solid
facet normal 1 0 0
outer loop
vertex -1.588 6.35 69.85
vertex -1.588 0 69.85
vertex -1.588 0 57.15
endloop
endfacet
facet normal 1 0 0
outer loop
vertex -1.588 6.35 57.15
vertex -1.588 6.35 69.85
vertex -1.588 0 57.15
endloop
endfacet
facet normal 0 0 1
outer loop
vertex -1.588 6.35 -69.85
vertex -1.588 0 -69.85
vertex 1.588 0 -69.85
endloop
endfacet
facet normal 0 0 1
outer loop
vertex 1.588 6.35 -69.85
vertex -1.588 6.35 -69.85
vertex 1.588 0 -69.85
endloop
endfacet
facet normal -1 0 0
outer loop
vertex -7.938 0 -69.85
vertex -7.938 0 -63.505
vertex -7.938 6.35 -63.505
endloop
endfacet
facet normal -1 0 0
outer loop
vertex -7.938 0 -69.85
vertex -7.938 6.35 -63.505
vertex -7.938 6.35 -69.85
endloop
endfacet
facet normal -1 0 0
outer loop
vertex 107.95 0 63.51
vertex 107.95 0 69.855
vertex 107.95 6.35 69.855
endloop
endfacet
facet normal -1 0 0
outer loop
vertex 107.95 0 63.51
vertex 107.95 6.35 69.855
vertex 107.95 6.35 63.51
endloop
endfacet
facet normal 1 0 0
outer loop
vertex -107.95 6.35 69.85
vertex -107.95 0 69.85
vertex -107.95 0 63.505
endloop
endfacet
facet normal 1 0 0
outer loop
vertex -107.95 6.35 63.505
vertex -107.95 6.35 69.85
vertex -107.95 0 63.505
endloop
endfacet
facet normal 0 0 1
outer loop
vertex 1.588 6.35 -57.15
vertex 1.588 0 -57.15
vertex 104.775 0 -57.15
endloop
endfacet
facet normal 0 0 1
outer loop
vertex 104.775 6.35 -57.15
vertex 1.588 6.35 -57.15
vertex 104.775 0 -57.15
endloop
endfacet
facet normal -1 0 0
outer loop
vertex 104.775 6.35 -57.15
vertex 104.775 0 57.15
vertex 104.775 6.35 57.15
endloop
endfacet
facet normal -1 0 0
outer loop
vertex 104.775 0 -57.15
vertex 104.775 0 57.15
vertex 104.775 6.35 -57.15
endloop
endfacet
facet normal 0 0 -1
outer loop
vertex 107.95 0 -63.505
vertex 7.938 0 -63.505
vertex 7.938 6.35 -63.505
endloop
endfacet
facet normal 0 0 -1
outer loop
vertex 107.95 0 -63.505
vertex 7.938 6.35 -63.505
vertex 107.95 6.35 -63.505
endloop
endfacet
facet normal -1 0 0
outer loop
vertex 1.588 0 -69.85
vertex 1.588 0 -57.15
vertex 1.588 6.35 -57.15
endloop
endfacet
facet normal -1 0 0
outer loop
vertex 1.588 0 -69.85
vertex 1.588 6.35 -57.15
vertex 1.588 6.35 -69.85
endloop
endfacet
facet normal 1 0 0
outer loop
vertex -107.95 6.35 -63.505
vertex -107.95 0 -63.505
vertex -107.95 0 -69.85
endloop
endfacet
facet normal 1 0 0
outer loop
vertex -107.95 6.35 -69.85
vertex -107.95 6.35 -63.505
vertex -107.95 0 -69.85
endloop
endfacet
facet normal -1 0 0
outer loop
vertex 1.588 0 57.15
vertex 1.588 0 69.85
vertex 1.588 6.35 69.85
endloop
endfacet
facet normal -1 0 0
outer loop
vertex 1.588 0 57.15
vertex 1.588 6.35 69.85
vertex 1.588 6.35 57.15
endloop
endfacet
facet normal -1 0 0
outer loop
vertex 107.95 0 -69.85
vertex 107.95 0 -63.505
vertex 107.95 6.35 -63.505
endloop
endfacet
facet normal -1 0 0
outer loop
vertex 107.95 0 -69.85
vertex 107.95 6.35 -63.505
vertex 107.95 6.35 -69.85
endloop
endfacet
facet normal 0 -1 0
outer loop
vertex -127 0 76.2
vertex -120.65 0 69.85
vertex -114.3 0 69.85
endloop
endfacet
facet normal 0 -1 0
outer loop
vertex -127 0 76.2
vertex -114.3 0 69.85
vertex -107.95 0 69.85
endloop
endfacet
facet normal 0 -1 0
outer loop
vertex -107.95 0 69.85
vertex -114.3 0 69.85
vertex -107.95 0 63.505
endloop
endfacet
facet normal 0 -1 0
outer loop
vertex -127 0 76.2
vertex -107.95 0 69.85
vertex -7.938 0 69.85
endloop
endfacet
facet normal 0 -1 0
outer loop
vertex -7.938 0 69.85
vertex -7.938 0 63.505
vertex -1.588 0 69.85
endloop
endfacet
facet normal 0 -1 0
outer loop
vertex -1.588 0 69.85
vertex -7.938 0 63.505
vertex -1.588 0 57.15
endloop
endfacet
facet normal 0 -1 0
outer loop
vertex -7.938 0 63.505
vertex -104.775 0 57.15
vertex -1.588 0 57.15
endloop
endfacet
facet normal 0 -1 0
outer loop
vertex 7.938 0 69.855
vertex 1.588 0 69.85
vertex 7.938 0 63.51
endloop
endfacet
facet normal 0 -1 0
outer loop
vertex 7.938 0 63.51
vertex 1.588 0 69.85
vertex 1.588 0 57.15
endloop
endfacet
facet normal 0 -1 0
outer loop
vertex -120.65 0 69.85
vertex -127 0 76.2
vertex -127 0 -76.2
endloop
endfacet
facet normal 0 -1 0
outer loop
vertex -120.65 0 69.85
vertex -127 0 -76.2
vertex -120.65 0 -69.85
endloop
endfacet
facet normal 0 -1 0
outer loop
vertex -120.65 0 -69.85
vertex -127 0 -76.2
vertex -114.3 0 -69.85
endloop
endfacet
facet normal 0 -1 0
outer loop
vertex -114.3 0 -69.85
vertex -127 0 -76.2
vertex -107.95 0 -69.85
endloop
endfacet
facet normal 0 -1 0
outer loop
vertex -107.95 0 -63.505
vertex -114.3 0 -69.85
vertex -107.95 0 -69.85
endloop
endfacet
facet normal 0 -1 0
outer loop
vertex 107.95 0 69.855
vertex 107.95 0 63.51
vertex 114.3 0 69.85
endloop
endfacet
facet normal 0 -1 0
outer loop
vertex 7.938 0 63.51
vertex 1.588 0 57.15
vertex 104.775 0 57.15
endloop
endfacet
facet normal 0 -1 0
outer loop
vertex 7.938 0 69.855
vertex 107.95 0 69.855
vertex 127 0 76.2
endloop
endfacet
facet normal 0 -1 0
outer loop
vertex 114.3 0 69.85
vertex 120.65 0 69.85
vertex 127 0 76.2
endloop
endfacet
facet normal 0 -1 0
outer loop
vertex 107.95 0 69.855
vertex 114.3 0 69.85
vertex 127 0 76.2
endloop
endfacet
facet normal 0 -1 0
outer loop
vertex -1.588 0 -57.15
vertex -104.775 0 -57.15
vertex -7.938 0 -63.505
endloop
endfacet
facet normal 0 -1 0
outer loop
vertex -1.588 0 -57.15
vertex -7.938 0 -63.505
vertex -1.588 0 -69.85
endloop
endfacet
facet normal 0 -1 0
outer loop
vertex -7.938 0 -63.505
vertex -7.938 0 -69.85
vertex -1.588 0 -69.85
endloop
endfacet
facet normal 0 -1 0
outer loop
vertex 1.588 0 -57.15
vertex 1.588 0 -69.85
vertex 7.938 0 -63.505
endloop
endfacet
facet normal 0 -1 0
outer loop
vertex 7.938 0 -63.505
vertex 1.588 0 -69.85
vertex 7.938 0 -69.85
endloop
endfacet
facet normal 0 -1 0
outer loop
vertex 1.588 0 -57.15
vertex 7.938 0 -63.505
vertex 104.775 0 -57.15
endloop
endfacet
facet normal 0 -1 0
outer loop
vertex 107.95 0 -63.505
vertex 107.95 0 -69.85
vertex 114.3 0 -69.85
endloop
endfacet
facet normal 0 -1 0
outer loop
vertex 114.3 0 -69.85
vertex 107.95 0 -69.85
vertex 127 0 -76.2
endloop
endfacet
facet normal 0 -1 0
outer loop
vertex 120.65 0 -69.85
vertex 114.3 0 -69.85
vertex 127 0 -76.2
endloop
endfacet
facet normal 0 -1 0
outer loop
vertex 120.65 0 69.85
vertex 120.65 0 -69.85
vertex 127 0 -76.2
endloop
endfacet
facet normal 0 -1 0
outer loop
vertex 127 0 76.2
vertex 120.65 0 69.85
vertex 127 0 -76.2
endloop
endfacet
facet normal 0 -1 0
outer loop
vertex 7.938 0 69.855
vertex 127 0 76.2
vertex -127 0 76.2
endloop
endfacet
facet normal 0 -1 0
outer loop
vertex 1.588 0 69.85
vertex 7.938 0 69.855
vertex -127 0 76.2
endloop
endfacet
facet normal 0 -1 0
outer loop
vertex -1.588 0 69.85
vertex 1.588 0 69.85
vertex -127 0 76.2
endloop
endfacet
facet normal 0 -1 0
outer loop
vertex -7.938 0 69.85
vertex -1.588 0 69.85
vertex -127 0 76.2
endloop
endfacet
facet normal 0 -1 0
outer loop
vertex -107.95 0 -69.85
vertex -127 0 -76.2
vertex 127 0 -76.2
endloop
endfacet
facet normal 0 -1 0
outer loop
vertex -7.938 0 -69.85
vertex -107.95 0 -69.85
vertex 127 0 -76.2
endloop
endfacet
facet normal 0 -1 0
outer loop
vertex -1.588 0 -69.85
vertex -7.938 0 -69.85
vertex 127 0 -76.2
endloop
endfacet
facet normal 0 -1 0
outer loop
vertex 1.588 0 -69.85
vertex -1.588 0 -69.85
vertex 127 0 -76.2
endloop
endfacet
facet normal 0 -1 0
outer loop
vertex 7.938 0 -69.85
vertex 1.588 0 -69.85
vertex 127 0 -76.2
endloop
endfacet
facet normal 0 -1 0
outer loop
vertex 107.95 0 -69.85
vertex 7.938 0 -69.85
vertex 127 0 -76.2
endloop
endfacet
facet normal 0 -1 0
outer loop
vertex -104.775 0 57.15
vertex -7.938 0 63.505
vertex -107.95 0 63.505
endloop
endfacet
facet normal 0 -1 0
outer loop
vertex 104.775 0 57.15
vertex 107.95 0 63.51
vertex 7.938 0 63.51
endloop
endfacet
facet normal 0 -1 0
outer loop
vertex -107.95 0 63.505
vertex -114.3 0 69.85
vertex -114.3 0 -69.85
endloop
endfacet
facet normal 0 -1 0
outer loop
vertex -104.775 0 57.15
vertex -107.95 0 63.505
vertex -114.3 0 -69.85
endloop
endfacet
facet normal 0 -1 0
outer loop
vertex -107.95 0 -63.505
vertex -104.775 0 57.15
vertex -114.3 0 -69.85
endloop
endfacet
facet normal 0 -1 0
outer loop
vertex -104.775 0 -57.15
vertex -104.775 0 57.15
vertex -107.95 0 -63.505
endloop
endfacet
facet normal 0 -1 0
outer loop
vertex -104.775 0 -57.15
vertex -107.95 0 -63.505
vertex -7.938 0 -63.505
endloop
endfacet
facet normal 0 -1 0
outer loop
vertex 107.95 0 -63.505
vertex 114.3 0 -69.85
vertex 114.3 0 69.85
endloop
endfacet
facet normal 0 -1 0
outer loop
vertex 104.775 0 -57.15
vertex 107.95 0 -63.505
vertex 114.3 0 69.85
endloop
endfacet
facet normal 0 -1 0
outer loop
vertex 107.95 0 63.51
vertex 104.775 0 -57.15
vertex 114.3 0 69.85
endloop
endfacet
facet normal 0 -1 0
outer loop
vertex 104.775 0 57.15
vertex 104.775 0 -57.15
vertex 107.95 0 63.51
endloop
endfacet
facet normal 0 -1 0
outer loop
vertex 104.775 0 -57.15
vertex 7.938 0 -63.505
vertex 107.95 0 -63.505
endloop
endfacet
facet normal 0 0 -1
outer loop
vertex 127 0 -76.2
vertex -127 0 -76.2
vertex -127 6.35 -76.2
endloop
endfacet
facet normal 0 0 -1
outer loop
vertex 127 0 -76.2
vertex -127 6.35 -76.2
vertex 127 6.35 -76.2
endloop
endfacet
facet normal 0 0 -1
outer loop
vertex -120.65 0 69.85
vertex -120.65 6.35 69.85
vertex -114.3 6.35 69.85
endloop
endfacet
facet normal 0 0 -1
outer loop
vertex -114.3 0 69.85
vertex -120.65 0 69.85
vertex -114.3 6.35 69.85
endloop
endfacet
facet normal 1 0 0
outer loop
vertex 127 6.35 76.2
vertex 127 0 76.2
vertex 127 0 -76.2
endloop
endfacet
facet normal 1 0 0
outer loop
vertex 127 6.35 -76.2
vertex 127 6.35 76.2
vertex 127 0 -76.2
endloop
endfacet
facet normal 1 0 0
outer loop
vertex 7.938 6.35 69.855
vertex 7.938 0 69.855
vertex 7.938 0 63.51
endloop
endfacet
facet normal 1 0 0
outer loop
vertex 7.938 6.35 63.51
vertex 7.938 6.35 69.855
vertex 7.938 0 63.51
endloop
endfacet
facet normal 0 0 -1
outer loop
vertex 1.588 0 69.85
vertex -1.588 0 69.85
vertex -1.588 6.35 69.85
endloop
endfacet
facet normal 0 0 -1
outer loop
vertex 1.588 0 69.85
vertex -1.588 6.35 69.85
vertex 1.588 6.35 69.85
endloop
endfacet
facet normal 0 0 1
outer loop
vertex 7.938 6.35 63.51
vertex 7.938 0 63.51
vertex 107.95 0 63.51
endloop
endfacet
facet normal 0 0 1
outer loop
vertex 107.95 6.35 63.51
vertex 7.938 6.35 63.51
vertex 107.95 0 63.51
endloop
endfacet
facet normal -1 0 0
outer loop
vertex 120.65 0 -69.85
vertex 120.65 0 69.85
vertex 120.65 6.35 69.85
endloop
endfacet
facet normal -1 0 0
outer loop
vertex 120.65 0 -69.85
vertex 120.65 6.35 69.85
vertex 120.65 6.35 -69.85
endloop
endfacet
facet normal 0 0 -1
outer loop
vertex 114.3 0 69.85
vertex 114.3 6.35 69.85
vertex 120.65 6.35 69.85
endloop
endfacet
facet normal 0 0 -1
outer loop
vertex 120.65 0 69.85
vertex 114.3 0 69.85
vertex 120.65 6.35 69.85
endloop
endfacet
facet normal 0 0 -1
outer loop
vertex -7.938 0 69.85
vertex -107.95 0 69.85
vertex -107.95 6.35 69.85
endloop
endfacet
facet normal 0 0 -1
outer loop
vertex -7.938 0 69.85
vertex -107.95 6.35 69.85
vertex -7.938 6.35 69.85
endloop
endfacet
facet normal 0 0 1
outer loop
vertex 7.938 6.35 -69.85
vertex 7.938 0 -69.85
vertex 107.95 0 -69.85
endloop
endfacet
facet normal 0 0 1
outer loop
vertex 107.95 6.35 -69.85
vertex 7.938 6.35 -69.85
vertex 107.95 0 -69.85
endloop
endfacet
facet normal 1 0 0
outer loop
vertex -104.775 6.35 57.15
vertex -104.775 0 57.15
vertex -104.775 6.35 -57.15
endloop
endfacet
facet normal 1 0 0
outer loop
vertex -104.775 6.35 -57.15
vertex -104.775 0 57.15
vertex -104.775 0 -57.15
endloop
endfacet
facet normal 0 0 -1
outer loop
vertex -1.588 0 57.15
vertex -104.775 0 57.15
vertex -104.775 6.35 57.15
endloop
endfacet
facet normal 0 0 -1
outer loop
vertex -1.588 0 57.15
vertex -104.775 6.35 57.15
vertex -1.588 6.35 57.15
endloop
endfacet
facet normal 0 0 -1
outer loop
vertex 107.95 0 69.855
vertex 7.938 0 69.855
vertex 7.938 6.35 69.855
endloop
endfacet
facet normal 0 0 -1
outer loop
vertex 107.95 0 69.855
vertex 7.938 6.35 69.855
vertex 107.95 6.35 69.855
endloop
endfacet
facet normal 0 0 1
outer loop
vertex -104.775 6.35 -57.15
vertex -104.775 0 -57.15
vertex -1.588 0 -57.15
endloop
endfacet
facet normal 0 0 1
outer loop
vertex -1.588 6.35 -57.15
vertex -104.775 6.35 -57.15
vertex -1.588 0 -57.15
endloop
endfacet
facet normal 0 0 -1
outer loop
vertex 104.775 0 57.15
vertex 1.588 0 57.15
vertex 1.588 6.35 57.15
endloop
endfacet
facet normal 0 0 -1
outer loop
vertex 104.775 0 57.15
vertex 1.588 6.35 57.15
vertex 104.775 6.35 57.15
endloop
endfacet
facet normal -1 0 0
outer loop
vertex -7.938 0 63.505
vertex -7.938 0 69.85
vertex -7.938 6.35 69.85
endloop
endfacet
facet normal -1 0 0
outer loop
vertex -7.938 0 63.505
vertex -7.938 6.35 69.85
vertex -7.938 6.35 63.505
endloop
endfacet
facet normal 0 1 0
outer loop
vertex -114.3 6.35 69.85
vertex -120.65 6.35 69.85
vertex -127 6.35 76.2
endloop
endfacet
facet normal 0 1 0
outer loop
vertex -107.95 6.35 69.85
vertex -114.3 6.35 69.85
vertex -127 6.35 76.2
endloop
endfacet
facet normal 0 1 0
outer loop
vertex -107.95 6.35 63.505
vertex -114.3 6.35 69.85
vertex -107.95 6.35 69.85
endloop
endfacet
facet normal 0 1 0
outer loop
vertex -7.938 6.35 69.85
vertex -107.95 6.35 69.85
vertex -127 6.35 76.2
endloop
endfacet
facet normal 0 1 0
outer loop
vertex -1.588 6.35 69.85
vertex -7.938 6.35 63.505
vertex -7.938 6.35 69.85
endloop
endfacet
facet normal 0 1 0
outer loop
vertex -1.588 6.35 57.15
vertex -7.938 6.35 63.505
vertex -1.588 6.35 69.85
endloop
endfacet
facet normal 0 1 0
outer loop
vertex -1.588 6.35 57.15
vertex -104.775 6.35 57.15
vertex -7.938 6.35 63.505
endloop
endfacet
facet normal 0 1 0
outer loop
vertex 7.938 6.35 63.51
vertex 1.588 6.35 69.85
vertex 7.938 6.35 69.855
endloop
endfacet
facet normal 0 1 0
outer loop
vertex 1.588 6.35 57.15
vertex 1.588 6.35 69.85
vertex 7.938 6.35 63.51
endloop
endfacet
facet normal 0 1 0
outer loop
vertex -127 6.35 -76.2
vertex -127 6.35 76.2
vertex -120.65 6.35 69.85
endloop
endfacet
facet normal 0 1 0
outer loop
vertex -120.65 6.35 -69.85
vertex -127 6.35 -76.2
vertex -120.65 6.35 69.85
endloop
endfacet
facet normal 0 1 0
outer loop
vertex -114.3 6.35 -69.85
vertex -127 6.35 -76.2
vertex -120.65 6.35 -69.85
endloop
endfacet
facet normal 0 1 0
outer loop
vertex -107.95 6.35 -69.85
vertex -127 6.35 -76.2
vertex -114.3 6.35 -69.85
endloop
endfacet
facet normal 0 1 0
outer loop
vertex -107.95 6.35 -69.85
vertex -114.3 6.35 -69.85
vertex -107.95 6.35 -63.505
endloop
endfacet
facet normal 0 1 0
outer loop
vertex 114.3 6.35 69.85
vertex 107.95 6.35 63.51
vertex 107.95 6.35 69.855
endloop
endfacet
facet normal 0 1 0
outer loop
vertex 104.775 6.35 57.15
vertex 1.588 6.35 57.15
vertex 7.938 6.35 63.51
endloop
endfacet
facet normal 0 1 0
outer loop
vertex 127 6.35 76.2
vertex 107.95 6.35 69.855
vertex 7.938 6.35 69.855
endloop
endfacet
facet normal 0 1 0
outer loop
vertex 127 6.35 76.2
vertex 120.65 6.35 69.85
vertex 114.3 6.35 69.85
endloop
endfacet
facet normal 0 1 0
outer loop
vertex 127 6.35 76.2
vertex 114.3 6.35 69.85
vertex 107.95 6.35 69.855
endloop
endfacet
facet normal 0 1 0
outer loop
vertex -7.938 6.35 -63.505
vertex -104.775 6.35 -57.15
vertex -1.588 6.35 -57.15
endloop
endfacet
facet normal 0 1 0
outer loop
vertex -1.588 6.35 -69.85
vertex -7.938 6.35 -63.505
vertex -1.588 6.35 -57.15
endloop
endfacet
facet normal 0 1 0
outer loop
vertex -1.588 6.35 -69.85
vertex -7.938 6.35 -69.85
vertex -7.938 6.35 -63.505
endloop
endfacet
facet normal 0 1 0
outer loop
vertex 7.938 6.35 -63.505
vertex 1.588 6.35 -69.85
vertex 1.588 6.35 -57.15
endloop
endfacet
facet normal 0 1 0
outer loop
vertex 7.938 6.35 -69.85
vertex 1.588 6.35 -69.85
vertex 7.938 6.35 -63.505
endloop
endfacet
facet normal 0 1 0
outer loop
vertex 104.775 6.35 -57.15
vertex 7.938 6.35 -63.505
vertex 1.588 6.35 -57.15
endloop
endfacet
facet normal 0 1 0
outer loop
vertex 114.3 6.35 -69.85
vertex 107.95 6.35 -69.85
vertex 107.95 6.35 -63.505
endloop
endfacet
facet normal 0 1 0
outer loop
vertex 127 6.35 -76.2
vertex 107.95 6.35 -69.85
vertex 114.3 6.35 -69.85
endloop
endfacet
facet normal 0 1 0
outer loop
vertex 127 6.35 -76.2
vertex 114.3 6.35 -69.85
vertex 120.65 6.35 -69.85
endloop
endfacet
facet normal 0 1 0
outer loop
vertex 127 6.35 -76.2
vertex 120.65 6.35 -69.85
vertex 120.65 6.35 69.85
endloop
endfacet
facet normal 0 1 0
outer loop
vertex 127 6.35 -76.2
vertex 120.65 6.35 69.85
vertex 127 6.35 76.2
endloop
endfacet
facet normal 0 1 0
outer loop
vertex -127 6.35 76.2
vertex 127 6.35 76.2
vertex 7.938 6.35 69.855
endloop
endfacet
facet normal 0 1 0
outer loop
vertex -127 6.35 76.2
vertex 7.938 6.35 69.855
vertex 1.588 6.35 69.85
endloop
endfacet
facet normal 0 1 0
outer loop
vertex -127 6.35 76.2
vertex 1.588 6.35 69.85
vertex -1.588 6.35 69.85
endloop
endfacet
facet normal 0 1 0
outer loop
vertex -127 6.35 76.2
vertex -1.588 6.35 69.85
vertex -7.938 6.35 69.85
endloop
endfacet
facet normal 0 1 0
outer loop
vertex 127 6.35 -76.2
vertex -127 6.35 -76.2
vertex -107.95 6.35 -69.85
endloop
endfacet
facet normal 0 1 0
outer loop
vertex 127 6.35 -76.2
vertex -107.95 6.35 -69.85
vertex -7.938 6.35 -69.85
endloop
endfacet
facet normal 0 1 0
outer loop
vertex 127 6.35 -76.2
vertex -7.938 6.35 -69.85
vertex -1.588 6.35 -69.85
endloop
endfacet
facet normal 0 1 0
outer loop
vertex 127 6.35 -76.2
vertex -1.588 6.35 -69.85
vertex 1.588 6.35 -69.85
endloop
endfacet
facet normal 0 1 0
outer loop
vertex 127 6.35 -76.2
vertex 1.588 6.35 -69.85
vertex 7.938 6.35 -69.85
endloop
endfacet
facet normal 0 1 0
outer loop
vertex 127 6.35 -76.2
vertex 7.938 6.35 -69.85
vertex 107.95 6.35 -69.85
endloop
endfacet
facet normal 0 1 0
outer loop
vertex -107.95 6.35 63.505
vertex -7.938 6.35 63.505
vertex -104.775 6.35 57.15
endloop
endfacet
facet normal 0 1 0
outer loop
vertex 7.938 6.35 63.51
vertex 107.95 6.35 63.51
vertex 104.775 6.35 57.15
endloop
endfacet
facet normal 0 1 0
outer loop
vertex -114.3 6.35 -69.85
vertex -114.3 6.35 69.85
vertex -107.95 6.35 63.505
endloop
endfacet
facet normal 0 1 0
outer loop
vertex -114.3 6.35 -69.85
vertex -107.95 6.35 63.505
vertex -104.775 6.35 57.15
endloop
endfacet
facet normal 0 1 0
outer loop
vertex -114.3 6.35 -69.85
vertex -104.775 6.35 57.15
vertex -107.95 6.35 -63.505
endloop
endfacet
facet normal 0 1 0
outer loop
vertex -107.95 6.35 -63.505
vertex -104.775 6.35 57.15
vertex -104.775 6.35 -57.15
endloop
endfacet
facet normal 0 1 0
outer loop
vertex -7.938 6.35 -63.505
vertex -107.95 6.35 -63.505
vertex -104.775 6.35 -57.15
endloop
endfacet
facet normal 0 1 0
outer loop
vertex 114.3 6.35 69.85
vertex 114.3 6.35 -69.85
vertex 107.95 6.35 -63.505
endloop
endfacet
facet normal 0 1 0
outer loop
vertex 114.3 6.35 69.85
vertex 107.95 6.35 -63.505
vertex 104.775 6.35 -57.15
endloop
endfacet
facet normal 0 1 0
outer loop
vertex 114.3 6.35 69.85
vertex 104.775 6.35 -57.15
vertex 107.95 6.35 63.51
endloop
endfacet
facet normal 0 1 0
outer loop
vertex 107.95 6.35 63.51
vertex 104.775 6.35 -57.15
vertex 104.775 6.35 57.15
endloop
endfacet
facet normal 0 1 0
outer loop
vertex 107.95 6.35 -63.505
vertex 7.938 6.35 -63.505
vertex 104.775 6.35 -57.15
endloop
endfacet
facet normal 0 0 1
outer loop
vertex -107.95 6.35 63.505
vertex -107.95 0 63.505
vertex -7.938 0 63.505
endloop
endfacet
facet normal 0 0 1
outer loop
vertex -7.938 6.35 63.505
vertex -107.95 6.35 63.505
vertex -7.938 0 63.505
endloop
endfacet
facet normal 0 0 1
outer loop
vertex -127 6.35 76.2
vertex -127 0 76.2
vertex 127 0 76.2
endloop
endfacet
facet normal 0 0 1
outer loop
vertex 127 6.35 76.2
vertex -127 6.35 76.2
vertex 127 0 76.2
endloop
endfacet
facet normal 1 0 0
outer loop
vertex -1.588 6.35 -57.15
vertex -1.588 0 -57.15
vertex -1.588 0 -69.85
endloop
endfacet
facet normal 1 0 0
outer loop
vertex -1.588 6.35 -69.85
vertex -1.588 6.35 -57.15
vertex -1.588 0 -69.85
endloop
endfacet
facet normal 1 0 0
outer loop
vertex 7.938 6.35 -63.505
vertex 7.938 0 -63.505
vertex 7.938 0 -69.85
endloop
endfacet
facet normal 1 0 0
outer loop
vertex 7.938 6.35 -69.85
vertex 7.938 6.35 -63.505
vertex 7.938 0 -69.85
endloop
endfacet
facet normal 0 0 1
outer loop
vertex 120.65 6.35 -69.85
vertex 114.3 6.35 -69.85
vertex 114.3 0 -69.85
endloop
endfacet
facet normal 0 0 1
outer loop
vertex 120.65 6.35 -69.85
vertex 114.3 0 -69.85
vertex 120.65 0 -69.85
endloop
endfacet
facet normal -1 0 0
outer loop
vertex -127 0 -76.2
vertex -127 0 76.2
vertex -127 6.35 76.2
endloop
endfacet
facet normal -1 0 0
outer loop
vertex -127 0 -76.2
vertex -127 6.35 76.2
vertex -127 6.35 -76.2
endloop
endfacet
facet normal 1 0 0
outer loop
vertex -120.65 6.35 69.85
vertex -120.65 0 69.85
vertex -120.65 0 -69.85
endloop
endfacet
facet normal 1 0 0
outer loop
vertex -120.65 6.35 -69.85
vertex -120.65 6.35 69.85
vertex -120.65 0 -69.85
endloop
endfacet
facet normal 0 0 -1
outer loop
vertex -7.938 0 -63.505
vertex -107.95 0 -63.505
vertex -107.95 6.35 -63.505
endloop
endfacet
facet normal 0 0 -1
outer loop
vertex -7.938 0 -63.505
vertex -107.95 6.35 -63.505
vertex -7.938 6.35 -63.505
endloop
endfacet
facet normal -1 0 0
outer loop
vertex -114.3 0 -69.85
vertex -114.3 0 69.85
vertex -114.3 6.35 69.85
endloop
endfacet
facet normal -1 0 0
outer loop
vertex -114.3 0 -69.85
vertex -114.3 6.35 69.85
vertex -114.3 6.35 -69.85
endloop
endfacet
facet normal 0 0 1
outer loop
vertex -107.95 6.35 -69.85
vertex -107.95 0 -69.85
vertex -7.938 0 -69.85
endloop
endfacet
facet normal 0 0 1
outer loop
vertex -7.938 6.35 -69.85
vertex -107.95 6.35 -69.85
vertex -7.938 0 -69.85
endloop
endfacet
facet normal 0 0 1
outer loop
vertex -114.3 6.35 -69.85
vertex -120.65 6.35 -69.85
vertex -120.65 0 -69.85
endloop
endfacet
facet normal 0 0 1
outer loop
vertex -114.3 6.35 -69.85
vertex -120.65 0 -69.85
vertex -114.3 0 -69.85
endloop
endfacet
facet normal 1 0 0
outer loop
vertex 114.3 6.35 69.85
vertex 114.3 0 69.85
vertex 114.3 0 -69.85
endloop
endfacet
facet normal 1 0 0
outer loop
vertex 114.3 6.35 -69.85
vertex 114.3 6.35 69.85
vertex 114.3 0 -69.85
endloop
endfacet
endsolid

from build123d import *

# Parameters (mm, degrees)
SKETCH1_W               = 254
SKETCH1_H               = 152.4
SKETCH1_W_2             = 6.35
SKETCH1_H_2             = 139.7
SKETCH1_W_3             = 3.175
SKETCH1_W_4             = 100.0125
SKETCH1_H_3             = 6.34492
BOSS_EXTRUDE1_DEPTH     = 6.35
SKETCH2_W               = 209.55
SKETCH2_H               = 114.3
CUT_EXTRUDE1_DEPTH      = 65.278
CUT_EXTRUDE1_DEPTH_BACK = 127


with BuildPart() as part:
    # Sketch1 → Boss-Extrude1 (new body)
    with BuildSketch(Plane(origin=(0, 0, 0), x_dir=(1, 0, 0), z_dir=(0, 1, 0))):
        Rectangle(SKETCH1_W, SKETCH1_H)
        with Locations((117.475, 0)):
            Rectangle(SKETCH1_W_2, SKETCH1_H_2, mode=Mode.SUBTRACT)
        Rectangle(SKETCH1_W_3, SKETCH1_H_2, mode=Mode.SUBTRACT)
        with Locations((-117.475, 0)):
            Rectangle(SKETCH1_W_2, SKETCH1_H_2, mode=Mode.SUBTRACT)
        with Locations((-57.94375, 66.67754)):
            Rectangle(SKETCH1_W_4, SKETCH1_H_3, mode=Mode.SUBTRACT)
        with Locations((57.94375, -66.68262)):
            Rectangle(SKETCH1_W_4, SKETCH1_H_3, mode=Mode.SUBTRACT)
        with Locations((57.94375, 66.67754)):
            Rectangle(SKETCH1_W_4, SKETCH1_H_3, mode=Mode.SUBTRACT)
        with Locations((-57.94375, -66.67754)):
            Rectangle(SKETCH1_W_4, SKETCH1_H_3, mode=Mode.SUBTRACT)
    extrude(amount=BOSS_EXTRUDE1_DEPTH)

    # Sketch2 → Cut-Extrude1 (cut, two sides)
    with BuildSketch(Plane(origin=(0, 0, 0), x_dir=(1, 0, 0), z_dir=(0, 1, 0))) as cut_extrude1_sk:
        Rectangle(SKETCH2_W, SKETCH2_H)
    extrude(amount=CUT_EXTRUDE1_DEPTH, mode=Mode.SUBTRACT)
    extrude(cut_extrude1_sk.sketch, amount=-CUT_EXTRUDE1_DEPTH_BACK, mode=Mode.SUBTRACT)


solid = part.part
